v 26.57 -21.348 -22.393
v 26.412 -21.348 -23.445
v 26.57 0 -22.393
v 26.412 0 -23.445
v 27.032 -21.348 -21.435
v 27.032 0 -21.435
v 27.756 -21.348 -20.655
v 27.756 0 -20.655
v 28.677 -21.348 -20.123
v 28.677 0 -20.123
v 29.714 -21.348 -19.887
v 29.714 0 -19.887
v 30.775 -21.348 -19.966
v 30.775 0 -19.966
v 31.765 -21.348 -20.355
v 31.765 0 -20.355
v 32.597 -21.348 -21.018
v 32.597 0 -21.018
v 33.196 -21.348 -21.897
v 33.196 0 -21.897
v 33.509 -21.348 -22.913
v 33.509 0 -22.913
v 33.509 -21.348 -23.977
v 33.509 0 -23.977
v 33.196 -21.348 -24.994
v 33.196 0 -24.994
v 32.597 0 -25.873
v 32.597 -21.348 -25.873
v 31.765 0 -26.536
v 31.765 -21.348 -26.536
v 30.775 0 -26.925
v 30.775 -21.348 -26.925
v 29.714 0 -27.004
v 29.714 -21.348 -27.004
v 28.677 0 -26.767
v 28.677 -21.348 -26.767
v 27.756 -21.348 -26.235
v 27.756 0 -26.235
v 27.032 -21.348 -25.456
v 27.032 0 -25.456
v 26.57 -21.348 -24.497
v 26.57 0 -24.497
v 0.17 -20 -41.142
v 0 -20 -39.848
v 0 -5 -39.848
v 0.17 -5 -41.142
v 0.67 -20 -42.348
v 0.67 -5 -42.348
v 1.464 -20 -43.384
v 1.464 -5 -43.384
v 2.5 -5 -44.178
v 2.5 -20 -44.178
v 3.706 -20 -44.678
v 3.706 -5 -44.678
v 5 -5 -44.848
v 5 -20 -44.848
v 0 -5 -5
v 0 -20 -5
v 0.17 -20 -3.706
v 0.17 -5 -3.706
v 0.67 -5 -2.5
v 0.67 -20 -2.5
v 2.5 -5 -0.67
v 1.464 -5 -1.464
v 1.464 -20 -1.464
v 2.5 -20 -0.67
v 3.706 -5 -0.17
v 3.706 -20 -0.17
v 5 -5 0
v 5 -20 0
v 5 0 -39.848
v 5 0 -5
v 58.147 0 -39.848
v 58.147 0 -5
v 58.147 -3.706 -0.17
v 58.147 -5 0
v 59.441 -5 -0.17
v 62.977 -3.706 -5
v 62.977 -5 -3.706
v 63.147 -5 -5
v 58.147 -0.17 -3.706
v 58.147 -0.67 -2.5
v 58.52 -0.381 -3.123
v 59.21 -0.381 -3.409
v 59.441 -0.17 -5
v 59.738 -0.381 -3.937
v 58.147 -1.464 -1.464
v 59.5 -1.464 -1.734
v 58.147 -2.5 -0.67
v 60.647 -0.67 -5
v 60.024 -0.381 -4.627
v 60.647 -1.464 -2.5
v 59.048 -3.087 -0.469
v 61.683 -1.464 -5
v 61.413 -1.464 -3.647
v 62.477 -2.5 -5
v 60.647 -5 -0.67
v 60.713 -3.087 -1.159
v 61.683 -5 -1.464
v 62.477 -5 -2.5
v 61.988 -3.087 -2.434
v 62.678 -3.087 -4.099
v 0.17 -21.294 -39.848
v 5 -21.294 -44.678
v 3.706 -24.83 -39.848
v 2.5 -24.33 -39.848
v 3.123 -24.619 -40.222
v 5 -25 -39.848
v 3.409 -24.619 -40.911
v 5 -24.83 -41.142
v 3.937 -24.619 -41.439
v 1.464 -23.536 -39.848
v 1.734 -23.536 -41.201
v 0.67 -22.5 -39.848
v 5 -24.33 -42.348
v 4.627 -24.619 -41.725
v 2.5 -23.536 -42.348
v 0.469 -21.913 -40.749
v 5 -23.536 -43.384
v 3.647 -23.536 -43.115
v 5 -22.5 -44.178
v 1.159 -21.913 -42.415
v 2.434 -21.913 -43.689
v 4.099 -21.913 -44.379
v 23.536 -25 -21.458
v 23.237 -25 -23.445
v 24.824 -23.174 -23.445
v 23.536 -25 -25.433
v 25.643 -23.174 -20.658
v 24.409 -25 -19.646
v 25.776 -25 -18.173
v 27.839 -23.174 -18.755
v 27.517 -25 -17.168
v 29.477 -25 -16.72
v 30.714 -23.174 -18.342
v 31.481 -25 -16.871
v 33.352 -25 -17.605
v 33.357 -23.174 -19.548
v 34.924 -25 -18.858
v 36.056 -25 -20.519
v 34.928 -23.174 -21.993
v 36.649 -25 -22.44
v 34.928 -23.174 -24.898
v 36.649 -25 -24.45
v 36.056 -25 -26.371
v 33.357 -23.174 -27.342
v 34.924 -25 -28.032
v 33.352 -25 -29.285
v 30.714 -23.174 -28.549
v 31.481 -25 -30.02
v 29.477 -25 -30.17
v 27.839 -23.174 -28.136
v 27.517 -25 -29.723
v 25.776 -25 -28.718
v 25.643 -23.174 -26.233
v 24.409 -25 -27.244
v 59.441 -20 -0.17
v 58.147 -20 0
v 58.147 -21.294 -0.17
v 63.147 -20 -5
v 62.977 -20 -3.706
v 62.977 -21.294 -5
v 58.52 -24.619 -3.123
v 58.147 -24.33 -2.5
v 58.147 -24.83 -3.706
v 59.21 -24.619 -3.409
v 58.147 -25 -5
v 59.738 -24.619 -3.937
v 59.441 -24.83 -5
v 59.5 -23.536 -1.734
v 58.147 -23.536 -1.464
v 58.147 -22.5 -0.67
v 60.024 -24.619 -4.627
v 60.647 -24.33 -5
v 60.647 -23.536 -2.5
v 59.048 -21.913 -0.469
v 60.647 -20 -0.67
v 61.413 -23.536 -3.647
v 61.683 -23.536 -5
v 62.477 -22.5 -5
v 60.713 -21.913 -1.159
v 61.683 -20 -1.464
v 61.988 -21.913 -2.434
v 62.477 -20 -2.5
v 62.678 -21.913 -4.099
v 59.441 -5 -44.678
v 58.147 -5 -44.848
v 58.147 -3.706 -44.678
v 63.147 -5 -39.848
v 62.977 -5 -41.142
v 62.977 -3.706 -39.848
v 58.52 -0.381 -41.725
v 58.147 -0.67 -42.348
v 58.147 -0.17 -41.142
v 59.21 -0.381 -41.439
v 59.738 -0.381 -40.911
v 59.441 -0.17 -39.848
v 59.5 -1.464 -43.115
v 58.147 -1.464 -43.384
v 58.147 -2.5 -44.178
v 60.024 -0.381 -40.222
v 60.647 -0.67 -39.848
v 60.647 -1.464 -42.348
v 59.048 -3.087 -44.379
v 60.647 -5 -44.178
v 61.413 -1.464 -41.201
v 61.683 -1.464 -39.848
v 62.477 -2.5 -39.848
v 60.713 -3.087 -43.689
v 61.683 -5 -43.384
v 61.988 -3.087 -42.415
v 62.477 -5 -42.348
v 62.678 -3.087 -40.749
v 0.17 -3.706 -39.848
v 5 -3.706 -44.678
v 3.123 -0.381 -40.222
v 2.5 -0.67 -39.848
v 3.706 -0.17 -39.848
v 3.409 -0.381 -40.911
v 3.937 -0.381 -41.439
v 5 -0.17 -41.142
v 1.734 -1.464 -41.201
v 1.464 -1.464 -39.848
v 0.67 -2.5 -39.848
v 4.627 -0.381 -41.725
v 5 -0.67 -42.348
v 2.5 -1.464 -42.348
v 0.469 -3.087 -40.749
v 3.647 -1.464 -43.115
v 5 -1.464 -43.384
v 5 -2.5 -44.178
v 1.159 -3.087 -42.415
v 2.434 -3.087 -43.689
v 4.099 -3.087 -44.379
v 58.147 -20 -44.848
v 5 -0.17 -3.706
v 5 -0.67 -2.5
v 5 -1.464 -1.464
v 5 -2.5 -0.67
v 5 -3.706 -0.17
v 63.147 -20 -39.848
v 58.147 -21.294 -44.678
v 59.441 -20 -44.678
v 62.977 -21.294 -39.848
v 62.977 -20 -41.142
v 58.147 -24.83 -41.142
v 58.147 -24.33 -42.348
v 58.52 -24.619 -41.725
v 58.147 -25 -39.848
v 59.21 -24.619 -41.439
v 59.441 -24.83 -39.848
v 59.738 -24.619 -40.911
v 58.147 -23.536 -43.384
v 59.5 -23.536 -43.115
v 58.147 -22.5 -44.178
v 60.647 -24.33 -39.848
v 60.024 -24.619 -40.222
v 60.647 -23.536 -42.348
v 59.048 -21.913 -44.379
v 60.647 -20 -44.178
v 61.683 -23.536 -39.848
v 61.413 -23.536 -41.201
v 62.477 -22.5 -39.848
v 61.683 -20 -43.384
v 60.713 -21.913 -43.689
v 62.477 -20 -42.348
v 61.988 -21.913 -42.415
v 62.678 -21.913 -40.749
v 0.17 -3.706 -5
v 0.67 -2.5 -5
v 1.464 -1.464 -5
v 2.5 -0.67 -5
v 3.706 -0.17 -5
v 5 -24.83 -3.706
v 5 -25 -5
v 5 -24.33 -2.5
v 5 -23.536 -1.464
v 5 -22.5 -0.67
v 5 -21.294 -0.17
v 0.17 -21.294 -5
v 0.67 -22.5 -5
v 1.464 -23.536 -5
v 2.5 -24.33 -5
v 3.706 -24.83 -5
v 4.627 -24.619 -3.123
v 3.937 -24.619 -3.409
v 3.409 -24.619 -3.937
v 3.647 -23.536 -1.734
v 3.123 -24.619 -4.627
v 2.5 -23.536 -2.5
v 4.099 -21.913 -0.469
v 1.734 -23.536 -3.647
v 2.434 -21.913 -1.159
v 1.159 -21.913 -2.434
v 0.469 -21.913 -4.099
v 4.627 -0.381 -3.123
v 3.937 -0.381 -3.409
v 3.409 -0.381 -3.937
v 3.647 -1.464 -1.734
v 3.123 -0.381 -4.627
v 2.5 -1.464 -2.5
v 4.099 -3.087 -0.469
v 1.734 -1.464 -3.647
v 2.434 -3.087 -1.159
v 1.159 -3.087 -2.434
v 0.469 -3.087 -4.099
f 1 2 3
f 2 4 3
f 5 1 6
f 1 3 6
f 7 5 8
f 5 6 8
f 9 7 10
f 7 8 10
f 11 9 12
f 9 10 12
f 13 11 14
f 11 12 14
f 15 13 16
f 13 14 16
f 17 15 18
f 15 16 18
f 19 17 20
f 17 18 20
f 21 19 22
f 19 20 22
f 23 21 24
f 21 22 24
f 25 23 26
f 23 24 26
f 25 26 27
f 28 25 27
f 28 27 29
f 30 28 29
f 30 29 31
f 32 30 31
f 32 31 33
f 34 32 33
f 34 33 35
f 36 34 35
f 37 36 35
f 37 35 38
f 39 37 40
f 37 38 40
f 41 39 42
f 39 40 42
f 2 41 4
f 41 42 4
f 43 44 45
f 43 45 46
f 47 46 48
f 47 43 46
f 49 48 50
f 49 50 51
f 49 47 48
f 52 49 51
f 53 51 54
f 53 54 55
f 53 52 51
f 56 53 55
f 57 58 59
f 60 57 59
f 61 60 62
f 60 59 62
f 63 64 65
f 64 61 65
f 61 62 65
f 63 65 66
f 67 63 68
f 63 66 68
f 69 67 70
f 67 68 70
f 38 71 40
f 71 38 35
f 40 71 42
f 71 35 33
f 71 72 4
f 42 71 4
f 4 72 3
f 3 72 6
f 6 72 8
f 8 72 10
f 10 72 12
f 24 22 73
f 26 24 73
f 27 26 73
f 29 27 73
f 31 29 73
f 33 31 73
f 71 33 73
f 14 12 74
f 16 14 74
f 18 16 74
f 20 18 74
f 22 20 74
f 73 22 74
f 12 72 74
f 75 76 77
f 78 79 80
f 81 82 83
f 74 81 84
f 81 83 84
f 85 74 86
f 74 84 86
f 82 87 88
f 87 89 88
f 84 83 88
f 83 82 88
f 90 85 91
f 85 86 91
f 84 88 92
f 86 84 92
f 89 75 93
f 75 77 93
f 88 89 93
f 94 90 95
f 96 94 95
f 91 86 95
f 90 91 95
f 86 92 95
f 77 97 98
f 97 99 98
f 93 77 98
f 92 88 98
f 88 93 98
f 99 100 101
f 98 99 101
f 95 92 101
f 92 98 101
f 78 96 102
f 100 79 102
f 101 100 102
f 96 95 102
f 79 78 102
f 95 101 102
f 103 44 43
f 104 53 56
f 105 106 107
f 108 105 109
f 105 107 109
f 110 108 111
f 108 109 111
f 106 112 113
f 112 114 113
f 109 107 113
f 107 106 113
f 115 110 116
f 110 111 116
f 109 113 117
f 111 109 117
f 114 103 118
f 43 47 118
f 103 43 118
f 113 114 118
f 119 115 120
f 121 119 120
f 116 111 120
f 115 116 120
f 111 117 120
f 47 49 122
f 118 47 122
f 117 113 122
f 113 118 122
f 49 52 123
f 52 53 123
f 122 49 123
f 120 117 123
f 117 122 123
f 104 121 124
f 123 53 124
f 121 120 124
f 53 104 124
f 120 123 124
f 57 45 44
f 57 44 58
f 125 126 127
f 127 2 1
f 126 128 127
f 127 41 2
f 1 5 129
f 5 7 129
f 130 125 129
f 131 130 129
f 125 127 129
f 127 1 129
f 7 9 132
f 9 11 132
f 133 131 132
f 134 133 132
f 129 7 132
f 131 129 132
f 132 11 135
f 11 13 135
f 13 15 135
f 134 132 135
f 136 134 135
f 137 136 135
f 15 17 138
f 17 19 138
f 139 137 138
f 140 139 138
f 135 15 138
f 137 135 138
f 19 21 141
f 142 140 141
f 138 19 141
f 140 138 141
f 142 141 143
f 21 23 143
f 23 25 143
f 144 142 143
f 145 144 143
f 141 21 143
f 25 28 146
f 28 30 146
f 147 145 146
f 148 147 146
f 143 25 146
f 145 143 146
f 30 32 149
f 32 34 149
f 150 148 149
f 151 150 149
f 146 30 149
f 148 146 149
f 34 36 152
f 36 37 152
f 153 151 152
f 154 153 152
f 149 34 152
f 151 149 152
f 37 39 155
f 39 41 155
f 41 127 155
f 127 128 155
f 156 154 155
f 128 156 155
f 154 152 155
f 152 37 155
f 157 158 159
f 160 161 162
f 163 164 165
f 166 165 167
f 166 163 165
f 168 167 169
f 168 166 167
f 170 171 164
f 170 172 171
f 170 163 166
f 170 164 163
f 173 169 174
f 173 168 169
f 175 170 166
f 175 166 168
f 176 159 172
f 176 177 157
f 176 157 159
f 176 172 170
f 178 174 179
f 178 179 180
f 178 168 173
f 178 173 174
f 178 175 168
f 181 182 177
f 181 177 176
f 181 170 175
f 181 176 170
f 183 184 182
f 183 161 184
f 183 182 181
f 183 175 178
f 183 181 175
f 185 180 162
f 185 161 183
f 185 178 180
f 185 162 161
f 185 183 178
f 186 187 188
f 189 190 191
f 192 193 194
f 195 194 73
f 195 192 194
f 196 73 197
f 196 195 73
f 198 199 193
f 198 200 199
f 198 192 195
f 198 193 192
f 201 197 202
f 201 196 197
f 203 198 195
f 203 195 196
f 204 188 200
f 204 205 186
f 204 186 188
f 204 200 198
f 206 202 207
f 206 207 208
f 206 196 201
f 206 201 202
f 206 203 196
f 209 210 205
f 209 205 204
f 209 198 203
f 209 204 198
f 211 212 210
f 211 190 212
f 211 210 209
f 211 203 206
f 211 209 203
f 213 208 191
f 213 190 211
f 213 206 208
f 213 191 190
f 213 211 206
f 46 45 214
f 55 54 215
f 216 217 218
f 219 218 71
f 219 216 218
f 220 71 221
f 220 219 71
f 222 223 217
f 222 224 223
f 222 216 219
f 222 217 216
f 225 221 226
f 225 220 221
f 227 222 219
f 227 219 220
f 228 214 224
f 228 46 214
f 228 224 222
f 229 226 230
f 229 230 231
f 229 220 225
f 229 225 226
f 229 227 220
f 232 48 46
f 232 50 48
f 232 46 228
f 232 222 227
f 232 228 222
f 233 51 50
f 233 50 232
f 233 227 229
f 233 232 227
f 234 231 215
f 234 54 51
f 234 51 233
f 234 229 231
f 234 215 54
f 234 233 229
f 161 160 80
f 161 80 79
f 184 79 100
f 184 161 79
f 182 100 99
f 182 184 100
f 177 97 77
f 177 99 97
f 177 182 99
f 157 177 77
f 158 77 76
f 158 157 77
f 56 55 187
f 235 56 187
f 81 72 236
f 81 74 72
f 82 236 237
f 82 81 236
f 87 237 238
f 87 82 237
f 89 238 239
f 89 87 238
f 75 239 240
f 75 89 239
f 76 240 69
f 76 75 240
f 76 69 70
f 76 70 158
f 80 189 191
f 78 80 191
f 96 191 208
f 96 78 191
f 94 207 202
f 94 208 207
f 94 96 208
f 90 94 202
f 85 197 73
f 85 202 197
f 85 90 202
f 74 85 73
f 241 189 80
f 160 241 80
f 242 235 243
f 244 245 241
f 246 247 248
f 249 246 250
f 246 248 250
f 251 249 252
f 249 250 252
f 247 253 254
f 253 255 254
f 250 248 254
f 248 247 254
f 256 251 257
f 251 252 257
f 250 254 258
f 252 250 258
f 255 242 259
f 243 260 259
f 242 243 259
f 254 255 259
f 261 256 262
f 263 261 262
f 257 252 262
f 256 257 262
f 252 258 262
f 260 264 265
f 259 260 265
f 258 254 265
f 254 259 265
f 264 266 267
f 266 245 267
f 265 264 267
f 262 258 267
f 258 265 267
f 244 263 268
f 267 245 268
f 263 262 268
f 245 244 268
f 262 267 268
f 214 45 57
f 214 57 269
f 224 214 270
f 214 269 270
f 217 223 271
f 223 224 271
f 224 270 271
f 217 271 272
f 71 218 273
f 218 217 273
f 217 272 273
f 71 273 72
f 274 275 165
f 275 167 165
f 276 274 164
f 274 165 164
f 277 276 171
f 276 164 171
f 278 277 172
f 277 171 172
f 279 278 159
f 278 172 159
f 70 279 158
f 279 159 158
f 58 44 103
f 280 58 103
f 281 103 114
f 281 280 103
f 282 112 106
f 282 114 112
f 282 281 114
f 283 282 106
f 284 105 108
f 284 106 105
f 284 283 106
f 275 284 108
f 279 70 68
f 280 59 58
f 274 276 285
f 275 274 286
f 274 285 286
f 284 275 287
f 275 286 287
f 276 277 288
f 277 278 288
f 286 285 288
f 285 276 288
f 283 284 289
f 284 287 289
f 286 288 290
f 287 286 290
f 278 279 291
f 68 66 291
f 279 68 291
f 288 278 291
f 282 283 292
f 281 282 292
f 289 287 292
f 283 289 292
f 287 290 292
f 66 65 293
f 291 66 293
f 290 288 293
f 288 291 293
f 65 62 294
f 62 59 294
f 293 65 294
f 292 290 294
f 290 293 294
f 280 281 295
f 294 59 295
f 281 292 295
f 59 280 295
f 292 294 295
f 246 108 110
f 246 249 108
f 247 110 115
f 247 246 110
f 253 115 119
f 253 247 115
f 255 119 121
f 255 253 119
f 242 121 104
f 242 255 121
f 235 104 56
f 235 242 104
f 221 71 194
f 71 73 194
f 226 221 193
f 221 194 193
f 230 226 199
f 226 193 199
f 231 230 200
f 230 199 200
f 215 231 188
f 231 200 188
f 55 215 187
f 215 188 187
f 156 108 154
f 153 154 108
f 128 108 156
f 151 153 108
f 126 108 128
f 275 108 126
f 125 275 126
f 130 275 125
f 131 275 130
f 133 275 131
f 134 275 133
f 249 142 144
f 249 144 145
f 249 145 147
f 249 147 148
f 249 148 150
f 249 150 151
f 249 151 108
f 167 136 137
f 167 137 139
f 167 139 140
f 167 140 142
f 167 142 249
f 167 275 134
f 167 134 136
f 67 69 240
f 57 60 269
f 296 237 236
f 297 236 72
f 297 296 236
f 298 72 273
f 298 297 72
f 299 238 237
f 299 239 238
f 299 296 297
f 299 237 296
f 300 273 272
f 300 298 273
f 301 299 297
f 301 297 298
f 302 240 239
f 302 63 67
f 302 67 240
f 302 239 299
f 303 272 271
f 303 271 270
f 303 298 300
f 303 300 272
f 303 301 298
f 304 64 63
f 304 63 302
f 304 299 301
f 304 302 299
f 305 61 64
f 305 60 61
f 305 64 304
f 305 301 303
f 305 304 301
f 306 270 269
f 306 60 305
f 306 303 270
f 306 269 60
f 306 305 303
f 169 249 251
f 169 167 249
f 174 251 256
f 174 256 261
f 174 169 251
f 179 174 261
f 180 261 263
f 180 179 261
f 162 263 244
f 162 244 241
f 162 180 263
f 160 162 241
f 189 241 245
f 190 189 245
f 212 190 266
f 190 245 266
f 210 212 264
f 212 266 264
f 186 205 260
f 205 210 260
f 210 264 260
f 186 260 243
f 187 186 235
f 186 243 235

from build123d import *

# Parameters (mm, degrees)
F0_W           = 63.1470456719
F0_H           = 44.8482893407
F1_DEPTH       = 25
F3_D           = 7.1374
F3_CSINK_D     = 13.4874
F3_CSINK_ANGLE = 82
F4_R           = 5


with BuildPart() as f1:
    # F0 (on Front) → F1 (new body)
    with BuildSketch(Plane.XZ):
        with Locations((31.573522836, -22.4241446704)):
            Rectangle(F0_W, F0_H)
    extrude(amount=F1_DEPTH)

    # F3 (through all)
    with Locations(Plane.XZ.offset(25)):
        with Locations((29.9805495888, -23.4452802688)):
            CounterSinkHole(F3_D / 2, F3_CSINK_D / 2, counter_sink_angle=F3_CSINK_ANGLE)

    # F4
    f4_edges = [f1.edges().sort_by_distance(p)[0] for p in [
        (63.147046, -12.5, 0),
        (0, -12.5, 0),
        (31.573523, 0, 0),
        (31.573523, -25, 0),
        (0, -12.5, -44.848289),
        (0, 0, -22.424145),
        (0, -25, -22.424145),
        (63.147046, -12.5, -44.848289),
        (31.573523, 0, -44.848289),
        (31.573523, -25, -44.848289),
        (63.147046, 0, -22.424145),
        (63.147046, -25, -22.424145),
    ]]
    fillet(f4_edges, radius=F4_R)


solid = f1.part
